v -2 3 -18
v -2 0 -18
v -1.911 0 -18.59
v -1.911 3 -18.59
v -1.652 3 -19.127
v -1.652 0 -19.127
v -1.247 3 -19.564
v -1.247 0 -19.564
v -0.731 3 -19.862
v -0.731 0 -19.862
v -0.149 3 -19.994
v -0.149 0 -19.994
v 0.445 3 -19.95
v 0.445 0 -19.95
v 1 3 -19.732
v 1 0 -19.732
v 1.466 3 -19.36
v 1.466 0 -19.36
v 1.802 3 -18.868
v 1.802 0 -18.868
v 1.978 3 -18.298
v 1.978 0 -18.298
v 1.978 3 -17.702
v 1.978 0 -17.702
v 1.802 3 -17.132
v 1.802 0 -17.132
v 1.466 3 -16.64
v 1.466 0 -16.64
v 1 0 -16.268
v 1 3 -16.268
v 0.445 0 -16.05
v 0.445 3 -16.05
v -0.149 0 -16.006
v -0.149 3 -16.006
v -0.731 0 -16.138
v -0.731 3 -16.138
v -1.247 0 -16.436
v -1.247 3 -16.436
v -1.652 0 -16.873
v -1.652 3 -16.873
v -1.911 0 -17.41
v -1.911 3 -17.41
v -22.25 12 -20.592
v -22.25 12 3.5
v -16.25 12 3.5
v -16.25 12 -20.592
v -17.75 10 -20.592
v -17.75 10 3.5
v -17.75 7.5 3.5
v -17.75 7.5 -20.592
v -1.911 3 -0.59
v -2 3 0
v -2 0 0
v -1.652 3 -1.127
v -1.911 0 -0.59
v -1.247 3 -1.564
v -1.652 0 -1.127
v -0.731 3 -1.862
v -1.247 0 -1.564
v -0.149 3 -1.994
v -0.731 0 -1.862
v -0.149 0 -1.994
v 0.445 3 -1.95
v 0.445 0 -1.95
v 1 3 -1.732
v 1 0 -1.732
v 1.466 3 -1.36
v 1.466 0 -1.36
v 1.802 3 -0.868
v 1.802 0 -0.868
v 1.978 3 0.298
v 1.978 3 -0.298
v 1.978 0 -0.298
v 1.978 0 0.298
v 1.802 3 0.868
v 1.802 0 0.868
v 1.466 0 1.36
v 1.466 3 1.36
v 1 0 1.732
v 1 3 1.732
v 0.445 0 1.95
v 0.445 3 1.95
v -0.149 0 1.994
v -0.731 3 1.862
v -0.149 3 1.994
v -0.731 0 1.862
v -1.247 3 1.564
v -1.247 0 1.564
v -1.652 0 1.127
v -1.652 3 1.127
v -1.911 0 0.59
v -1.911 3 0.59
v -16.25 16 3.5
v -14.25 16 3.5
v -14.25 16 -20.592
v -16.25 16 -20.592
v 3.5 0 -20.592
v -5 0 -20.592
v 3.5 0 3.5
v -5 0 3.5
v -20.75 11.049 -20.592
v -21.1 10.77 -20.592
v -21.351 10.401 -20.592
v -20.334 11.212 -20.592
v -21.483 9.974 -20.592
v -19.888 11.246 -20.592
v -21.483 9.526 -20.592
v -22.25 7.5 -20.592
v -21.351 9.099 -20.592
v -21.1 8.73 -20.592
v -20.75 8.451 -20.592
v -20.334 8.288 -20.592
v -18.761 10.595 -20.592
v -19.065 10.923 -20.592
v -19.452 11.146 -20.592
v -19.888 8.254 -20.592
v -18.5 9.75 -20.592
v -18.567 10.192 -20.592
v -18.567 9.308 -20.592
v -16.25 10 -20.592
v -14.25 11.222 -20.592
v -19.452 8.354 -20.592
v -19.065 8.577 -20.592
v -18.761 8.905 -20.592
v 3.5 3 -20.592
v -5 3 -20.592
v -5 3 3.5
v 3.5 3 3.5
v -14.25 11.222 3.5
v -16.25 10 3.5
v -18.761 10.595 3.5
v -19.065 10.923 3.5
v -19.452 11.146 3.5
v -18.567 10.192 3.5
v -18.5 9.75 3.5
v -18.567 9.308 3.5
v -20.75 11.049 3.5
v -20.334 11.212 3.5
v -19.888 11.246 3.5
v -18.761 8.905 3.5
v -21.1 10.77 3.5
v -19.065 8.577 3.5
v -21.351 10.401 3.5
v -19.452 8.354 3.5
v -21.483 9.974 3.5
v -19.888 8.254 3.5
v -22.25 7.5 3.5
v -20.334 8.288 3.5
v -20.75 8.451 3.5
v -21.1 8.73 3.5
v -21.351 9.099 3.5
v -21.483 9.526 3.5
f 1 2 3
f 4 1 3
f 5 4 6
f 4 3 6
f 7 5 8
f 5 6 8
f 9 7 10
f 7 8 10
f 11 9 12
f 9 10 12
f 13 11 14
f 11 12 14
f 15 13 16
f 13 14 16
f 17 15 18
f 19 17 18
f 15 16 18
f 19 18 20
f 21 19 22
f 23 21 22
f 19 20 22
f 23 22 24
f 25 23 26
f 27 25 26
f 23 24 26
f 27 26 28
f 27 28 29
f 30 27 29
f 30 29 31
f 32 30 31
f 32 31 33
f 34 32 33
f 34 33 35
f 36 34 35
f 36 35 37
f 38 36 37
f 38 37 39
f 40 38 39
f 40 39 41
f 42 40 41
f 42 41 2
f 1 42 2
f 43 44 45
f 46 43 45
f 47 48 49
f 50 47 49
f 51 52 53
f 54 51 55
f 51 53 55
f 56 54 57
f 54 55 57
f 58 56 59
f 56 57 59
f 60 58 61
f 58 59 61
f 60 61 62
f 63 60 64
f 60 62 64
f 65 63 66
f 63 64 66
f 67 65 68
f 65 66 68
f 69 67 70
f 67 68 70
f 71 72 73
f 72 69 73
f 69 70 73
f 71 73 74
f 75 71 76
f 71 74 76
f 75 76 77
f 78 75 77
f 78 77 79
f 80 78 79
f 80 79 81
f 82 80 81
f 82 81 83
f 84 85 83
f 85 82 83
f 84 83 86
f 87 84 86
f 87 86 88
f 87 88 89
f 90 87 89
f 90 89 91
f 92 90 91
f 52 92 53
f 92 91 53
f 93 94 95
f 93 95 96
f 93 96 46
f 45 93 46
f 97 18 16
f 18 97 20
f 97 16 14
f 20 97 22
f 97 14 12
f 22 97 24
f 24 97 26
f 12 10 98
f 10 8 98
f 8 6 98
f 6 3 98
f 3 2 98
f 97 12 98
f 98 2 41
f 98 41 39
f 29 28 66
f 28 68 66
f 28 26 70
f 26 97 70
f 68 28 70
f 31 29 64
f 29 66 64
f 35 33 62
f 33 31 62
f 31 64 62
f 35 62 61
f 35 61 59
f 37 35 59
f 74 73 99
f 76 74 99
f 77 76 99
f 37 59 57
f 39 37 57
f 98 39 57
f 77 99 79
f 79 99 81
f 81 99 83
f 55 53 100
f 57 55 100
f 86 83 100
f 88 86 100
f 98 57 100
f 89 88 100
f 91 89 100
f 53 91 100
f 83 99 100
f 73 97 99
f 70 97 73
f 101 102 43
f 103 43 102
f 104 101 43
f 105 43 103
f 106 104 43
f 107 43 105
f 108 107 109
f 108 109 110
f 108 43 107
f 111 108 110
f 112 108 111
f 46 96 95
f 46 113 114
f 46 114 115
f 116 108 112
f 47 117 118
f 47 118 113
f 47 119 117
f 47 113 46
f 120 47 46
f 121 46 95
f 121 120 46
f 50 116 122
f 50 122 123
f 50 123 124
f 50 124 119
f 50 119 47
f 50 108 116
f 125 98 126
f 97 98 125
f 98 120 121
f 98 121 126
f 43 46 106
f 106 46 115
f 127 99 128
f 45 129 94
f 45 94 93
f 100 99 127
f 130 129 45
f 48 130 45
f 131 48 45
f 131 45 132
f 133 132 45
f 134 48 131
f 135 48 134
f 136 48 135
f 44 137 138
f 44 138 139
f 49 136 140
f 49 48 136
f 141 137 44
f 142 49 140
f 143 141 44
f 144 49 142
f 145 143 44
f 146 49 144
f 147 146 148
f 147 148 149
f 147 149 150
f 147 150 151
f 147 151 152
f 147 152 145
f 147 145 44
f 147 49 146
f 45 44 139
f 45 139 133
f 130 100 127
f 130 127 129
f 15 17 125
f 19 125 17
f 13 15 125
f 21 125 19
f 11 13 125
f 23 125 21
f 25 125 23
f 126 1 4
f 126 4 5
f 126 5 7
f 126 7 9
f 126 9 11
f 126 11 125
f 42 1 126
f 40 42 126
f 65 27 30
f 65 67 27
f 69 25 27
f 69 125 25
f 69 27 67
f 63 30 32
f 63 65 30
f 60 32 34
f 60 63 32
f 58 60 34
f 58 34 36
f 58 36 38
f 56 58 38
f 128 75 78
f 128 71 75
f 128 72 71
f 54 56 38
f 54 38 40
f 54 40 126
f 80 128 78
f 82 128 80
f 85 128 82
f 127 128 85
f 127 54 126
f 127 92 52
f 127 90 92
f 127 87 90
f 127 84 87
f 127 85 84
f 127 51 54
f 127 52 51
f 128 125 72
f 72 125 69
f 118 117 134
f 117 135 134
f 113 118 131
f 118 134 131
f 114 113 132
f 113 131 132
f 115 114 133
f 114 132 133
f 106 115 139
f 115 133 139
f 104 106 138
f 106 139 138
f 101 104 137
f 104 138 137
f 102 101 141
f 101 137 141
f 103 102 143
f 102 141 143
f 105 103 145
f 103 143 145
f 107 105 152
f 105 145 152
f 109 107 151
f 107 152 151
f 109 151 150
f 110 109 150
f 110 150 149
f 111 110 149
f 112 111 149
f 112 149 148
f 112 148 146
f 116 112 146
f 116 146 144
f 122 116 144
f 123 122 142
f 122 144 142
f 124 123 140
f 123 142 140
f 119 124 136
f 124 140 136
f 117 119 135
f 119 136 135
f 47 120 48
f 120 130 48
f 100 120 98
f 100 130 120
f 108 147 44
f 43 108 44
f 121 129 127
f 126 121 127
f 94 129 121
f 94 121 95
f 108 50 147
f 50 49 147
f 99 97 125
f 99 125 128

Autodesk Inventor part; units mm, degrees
ref_plane "YZ Plane" through (0, 0, 0) normal (1, 0, 0) x (0, 1, 0)
ref_plane "XZ Plane" through (0, 0, 0) normal (0, 1, 0) x (-1, 0, 0)
ref_plane "XY Plane" through (0, 0, 0) normal (0, 0, 1) x (1, 0, 0)
sketch "Sketch1" plane through (0, 0, 0) normal (0, 1, 0) x (-1, 0, 0)
  line L0 (0, 0) -> (0, -18)
  circle A0 centre (0, 0) radius 2
  circle A1 centre (0, -18) radius 2
  line L1 (0, -18) -> (5, -18)
  line L2 (5, -18) -> (5, -20.5922)
  line L3 (5, -20.5922) -> (0, -20.5922)
  line L4 (0, -20.5922) -> (0, -18)
  line L5 (0, 0) -> (-3.5, 0)
  line L6 (-3.5, 0) -> (-3.5, 3.5)
  line L7 (-3.5, 3.5) -> (0, 3.5)
  line L8 (0, 3.5) -> (0, 0)
  line L9 (-3.5, 3.5) -> (5, 3.5)
  line L10 (5, 3.5) -> (5, -20.5922)
  line L11 (5, -20.5922) -> (-3.5, -20.5922)
  line L12 (-3.5, -20.5922) -> (-3.5, 3.5)
  dimension "d0" = 18
  dimension "d1" = 4
  dimension "d2" = 4
  dimension "d3" = 5
  dimension "d4" = 3.5
  dimension "d5" = 3.5
extrude "Extrusion1" add sketch "Sketch1" along normal blind 3 contours A0 L8 L9 L10 L1 A1 L0 | L0 A1 L4 L11 L12 L5 A0 | L5 L6 L7 L8 A0 | L1 L2 L3 L4 A1
sketch "Sketch2" plane through (-5, 0, 3.5) normal (0, 0, 1) x (1, 0, 0)
  line L0 (0, 3) -> (4.25, 3)
  line L1 (0, 3) -> (8.5, 3) projected
  line L2 (4.25, 3) -> (-96.75, 3)
  line L3 (-46.25, 3) -> (-11.25, 3)
  line L4 (-11.25, 3) -> (-11.25, 13)
  line L5 (-11.25, 13) -> (0, 3)
  line L6 (-11.25, 13) -> (-11.25, 10)
  line L7 (0, 0) -> (0, 3) projected
  line L8 (-11.25, 10) -> (0, 0)
  line L9 (-11.25, 10) -> (-17.25, 10)
  line L10 (-17.25, 10) -> (-17.25, 12)
  line L11 (-17.25, 12) -> (-11.25, 12)
  line L12 (-11.25, 12) -> (-11.25, 10)
  line L13 (-11.25, 10) -> (-9.25, 10)
  line L14 (-9.25, 10) -> (-9.25, 16)
  line L15 (-9.25, 16) -> (-11.25, 16)
  line L16 (-11.25, 16) -> (-11.25, 10)
  line L17 (-17.25, 10) -> (-12.75, 10)
  line L18 (-12.75, 10) -> (-12.75, 7.5)
  line L19 (-12.75, 7.5) -> (-17.25, 7.5)
  line L20 (-17.25, 7.5) -> (-17.25, 10)
  line L21 (-15, 10) -> (-15, 9.75)
  circle A0 centre (-15, 9.75) radius 1.5
  point P0 (5, 0)
  point P1 (-11.25, 12)
  point P2 (-11.25, 13)
  point P3 (-9.25, 11.2222)
  dimension "d8" = 101
  dimension "d9" = 35
  dimension "d10" = 10
  dimension "d11" = 3
  dimension "d12" = 6
  dimension "d13" = 2
  dimension "d17" = 2
  dimension "d18" = 6
  dimension "d25" = 4.5
  dimension "d26" = 2.5
  dimension "d27" = 0.25
  dimension "d28" = 3
extrude "Extrusion2" add sketch "Sketch2" against normal up to surface (24.0922 mm away) contours L7 L8 L2 | L2 L8 L13 L14 L5 | L14 L13 L4 L5 | L5 L16 L15 L14 | L9 A0 L10 L11 L4 | L18 L19 L20 L9 A0
properties part number "suport3_pcb_temp"
